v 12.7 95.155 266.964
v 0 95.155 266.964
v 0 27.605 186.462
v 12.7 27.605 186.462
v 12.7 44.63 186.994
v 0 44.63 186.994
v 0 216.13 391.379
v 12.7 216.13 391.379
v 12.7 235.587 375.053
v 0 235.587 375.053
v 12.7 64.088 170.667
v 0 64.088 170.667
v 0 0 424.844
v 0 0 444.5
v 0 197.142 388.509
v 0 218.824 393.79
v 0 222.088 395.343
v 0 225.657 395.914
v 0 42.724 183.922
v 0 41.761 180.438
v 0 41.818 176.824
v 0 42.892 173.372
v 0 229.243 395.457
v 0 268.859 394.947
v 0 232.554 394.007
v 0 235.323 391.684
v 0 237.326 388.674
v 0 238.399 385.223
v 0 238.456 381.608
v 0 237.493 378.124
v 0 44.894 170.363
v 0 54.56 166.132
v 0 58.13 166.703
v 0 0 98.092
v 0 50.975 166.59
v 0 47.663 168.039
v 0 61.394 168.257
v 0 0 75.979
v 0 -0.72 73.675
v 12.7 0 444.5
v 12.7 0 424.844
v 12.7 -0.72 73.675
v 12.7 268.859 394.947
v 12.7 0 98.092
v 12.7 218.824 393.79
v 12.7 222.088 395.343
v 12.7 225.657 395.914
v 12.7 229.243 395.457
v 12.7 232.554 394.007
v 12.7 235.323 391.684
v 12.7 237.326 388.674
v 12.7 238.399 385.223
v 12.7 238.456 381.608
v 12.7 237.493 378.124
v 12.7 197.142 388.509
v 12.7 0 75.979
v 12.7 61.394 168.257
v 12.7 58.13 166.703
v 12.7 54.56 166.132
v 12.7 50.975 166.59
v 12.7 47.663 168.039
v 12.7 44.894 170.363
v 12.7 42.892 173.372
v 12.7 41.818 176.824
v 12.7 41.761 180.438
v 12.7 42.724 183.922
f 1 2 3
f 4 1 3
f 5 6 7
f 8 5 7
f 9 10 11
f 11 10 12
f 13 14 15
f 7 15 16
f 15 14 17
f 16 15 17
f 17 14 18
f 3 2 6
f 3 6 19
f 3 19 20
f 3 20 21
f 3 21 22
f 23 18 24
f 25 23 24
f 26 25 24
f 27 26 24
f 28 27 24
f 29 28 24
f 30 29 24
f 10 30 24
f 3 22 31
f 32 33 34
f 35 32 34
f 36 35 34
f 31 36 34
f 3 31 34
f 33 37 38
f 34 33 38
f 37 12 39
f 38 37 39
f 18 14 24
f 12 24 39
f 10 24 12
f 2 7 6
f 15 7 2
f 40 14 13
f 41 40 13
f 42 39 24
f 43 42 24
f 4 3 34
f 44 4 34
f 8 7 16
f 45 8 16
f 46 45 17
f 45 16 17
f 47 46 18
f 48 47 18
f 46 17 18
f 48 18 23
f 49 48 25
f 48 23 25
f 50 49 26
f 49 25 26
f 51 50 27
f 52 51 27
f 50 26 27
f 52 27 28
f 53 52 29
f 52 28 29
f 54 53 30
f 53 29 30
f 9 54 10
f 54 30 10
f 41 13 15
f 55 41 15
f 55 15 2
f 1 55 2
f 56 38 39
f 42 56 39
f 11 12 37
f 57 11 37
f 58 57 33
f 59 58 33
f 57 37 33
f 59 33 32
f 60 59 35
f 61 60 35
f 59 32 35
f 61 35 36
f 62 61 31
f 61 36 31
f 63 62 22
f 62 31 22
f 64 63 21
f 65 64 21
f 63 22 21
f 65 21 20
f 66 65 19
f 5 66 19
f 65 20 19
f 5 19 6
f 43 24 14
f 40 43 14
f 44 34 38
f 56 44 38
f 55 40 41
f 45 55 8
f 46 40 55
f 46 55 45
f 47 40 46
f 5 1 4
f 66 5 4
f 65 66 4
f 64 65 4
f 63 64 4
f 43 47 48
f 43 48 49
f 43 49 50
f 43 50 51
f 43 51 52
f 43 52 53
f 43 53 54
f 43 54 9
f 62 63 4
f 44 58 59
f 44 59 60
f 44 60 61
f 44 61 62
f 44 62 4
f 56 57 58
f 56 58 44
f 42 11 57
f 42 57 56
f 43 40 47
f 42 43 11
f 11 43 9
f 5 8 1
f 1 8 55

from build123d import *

# Parameters (mm, degrees)
BOSS_EXTRUDE1_DEPTH = 12.7


with BuildPart() as part:
    # Sketch1 → Boss-Extrude1 (new body)
    with BuildSketch(Plane(origin=(0, 0, 0), x_dir=(0, 0, -1), z_dir=(1, 0, 0))):
        Polygon((-394.946506416, 268.859), (-444.5, 0), (-424.843977237, 0), (-388.508616862, 197.142278951), (-266.964417858, 95.154586396), (-186.461552382, 27.604661666), (-98.092418556, 0), (-75.979077973, 0), (-73.675108156, -0.719711788), align=None)
        with BuildLine():
            Line((-375.052513862, 235.58728561), (-170.667115901, 64.087573564))
            ThreePointArc((-170.667115901, 64.087573564), (-169.101754117, 46.195406493), (-186.993921187, 44.630044709))
            Line((-186.993921187, 44.630044709), (-391.379319148, 216.129756755))
            ThreePointArc((-391.379319148, 216.129756755), (-392.944680933, 234.021923826), (-375.052513862, 235.58728561))
        make_face(mode=Mode.SUBTRACT)
    extrude(amount=BOSS_EXTRUDE1_DEPTH)


solid = part.part
